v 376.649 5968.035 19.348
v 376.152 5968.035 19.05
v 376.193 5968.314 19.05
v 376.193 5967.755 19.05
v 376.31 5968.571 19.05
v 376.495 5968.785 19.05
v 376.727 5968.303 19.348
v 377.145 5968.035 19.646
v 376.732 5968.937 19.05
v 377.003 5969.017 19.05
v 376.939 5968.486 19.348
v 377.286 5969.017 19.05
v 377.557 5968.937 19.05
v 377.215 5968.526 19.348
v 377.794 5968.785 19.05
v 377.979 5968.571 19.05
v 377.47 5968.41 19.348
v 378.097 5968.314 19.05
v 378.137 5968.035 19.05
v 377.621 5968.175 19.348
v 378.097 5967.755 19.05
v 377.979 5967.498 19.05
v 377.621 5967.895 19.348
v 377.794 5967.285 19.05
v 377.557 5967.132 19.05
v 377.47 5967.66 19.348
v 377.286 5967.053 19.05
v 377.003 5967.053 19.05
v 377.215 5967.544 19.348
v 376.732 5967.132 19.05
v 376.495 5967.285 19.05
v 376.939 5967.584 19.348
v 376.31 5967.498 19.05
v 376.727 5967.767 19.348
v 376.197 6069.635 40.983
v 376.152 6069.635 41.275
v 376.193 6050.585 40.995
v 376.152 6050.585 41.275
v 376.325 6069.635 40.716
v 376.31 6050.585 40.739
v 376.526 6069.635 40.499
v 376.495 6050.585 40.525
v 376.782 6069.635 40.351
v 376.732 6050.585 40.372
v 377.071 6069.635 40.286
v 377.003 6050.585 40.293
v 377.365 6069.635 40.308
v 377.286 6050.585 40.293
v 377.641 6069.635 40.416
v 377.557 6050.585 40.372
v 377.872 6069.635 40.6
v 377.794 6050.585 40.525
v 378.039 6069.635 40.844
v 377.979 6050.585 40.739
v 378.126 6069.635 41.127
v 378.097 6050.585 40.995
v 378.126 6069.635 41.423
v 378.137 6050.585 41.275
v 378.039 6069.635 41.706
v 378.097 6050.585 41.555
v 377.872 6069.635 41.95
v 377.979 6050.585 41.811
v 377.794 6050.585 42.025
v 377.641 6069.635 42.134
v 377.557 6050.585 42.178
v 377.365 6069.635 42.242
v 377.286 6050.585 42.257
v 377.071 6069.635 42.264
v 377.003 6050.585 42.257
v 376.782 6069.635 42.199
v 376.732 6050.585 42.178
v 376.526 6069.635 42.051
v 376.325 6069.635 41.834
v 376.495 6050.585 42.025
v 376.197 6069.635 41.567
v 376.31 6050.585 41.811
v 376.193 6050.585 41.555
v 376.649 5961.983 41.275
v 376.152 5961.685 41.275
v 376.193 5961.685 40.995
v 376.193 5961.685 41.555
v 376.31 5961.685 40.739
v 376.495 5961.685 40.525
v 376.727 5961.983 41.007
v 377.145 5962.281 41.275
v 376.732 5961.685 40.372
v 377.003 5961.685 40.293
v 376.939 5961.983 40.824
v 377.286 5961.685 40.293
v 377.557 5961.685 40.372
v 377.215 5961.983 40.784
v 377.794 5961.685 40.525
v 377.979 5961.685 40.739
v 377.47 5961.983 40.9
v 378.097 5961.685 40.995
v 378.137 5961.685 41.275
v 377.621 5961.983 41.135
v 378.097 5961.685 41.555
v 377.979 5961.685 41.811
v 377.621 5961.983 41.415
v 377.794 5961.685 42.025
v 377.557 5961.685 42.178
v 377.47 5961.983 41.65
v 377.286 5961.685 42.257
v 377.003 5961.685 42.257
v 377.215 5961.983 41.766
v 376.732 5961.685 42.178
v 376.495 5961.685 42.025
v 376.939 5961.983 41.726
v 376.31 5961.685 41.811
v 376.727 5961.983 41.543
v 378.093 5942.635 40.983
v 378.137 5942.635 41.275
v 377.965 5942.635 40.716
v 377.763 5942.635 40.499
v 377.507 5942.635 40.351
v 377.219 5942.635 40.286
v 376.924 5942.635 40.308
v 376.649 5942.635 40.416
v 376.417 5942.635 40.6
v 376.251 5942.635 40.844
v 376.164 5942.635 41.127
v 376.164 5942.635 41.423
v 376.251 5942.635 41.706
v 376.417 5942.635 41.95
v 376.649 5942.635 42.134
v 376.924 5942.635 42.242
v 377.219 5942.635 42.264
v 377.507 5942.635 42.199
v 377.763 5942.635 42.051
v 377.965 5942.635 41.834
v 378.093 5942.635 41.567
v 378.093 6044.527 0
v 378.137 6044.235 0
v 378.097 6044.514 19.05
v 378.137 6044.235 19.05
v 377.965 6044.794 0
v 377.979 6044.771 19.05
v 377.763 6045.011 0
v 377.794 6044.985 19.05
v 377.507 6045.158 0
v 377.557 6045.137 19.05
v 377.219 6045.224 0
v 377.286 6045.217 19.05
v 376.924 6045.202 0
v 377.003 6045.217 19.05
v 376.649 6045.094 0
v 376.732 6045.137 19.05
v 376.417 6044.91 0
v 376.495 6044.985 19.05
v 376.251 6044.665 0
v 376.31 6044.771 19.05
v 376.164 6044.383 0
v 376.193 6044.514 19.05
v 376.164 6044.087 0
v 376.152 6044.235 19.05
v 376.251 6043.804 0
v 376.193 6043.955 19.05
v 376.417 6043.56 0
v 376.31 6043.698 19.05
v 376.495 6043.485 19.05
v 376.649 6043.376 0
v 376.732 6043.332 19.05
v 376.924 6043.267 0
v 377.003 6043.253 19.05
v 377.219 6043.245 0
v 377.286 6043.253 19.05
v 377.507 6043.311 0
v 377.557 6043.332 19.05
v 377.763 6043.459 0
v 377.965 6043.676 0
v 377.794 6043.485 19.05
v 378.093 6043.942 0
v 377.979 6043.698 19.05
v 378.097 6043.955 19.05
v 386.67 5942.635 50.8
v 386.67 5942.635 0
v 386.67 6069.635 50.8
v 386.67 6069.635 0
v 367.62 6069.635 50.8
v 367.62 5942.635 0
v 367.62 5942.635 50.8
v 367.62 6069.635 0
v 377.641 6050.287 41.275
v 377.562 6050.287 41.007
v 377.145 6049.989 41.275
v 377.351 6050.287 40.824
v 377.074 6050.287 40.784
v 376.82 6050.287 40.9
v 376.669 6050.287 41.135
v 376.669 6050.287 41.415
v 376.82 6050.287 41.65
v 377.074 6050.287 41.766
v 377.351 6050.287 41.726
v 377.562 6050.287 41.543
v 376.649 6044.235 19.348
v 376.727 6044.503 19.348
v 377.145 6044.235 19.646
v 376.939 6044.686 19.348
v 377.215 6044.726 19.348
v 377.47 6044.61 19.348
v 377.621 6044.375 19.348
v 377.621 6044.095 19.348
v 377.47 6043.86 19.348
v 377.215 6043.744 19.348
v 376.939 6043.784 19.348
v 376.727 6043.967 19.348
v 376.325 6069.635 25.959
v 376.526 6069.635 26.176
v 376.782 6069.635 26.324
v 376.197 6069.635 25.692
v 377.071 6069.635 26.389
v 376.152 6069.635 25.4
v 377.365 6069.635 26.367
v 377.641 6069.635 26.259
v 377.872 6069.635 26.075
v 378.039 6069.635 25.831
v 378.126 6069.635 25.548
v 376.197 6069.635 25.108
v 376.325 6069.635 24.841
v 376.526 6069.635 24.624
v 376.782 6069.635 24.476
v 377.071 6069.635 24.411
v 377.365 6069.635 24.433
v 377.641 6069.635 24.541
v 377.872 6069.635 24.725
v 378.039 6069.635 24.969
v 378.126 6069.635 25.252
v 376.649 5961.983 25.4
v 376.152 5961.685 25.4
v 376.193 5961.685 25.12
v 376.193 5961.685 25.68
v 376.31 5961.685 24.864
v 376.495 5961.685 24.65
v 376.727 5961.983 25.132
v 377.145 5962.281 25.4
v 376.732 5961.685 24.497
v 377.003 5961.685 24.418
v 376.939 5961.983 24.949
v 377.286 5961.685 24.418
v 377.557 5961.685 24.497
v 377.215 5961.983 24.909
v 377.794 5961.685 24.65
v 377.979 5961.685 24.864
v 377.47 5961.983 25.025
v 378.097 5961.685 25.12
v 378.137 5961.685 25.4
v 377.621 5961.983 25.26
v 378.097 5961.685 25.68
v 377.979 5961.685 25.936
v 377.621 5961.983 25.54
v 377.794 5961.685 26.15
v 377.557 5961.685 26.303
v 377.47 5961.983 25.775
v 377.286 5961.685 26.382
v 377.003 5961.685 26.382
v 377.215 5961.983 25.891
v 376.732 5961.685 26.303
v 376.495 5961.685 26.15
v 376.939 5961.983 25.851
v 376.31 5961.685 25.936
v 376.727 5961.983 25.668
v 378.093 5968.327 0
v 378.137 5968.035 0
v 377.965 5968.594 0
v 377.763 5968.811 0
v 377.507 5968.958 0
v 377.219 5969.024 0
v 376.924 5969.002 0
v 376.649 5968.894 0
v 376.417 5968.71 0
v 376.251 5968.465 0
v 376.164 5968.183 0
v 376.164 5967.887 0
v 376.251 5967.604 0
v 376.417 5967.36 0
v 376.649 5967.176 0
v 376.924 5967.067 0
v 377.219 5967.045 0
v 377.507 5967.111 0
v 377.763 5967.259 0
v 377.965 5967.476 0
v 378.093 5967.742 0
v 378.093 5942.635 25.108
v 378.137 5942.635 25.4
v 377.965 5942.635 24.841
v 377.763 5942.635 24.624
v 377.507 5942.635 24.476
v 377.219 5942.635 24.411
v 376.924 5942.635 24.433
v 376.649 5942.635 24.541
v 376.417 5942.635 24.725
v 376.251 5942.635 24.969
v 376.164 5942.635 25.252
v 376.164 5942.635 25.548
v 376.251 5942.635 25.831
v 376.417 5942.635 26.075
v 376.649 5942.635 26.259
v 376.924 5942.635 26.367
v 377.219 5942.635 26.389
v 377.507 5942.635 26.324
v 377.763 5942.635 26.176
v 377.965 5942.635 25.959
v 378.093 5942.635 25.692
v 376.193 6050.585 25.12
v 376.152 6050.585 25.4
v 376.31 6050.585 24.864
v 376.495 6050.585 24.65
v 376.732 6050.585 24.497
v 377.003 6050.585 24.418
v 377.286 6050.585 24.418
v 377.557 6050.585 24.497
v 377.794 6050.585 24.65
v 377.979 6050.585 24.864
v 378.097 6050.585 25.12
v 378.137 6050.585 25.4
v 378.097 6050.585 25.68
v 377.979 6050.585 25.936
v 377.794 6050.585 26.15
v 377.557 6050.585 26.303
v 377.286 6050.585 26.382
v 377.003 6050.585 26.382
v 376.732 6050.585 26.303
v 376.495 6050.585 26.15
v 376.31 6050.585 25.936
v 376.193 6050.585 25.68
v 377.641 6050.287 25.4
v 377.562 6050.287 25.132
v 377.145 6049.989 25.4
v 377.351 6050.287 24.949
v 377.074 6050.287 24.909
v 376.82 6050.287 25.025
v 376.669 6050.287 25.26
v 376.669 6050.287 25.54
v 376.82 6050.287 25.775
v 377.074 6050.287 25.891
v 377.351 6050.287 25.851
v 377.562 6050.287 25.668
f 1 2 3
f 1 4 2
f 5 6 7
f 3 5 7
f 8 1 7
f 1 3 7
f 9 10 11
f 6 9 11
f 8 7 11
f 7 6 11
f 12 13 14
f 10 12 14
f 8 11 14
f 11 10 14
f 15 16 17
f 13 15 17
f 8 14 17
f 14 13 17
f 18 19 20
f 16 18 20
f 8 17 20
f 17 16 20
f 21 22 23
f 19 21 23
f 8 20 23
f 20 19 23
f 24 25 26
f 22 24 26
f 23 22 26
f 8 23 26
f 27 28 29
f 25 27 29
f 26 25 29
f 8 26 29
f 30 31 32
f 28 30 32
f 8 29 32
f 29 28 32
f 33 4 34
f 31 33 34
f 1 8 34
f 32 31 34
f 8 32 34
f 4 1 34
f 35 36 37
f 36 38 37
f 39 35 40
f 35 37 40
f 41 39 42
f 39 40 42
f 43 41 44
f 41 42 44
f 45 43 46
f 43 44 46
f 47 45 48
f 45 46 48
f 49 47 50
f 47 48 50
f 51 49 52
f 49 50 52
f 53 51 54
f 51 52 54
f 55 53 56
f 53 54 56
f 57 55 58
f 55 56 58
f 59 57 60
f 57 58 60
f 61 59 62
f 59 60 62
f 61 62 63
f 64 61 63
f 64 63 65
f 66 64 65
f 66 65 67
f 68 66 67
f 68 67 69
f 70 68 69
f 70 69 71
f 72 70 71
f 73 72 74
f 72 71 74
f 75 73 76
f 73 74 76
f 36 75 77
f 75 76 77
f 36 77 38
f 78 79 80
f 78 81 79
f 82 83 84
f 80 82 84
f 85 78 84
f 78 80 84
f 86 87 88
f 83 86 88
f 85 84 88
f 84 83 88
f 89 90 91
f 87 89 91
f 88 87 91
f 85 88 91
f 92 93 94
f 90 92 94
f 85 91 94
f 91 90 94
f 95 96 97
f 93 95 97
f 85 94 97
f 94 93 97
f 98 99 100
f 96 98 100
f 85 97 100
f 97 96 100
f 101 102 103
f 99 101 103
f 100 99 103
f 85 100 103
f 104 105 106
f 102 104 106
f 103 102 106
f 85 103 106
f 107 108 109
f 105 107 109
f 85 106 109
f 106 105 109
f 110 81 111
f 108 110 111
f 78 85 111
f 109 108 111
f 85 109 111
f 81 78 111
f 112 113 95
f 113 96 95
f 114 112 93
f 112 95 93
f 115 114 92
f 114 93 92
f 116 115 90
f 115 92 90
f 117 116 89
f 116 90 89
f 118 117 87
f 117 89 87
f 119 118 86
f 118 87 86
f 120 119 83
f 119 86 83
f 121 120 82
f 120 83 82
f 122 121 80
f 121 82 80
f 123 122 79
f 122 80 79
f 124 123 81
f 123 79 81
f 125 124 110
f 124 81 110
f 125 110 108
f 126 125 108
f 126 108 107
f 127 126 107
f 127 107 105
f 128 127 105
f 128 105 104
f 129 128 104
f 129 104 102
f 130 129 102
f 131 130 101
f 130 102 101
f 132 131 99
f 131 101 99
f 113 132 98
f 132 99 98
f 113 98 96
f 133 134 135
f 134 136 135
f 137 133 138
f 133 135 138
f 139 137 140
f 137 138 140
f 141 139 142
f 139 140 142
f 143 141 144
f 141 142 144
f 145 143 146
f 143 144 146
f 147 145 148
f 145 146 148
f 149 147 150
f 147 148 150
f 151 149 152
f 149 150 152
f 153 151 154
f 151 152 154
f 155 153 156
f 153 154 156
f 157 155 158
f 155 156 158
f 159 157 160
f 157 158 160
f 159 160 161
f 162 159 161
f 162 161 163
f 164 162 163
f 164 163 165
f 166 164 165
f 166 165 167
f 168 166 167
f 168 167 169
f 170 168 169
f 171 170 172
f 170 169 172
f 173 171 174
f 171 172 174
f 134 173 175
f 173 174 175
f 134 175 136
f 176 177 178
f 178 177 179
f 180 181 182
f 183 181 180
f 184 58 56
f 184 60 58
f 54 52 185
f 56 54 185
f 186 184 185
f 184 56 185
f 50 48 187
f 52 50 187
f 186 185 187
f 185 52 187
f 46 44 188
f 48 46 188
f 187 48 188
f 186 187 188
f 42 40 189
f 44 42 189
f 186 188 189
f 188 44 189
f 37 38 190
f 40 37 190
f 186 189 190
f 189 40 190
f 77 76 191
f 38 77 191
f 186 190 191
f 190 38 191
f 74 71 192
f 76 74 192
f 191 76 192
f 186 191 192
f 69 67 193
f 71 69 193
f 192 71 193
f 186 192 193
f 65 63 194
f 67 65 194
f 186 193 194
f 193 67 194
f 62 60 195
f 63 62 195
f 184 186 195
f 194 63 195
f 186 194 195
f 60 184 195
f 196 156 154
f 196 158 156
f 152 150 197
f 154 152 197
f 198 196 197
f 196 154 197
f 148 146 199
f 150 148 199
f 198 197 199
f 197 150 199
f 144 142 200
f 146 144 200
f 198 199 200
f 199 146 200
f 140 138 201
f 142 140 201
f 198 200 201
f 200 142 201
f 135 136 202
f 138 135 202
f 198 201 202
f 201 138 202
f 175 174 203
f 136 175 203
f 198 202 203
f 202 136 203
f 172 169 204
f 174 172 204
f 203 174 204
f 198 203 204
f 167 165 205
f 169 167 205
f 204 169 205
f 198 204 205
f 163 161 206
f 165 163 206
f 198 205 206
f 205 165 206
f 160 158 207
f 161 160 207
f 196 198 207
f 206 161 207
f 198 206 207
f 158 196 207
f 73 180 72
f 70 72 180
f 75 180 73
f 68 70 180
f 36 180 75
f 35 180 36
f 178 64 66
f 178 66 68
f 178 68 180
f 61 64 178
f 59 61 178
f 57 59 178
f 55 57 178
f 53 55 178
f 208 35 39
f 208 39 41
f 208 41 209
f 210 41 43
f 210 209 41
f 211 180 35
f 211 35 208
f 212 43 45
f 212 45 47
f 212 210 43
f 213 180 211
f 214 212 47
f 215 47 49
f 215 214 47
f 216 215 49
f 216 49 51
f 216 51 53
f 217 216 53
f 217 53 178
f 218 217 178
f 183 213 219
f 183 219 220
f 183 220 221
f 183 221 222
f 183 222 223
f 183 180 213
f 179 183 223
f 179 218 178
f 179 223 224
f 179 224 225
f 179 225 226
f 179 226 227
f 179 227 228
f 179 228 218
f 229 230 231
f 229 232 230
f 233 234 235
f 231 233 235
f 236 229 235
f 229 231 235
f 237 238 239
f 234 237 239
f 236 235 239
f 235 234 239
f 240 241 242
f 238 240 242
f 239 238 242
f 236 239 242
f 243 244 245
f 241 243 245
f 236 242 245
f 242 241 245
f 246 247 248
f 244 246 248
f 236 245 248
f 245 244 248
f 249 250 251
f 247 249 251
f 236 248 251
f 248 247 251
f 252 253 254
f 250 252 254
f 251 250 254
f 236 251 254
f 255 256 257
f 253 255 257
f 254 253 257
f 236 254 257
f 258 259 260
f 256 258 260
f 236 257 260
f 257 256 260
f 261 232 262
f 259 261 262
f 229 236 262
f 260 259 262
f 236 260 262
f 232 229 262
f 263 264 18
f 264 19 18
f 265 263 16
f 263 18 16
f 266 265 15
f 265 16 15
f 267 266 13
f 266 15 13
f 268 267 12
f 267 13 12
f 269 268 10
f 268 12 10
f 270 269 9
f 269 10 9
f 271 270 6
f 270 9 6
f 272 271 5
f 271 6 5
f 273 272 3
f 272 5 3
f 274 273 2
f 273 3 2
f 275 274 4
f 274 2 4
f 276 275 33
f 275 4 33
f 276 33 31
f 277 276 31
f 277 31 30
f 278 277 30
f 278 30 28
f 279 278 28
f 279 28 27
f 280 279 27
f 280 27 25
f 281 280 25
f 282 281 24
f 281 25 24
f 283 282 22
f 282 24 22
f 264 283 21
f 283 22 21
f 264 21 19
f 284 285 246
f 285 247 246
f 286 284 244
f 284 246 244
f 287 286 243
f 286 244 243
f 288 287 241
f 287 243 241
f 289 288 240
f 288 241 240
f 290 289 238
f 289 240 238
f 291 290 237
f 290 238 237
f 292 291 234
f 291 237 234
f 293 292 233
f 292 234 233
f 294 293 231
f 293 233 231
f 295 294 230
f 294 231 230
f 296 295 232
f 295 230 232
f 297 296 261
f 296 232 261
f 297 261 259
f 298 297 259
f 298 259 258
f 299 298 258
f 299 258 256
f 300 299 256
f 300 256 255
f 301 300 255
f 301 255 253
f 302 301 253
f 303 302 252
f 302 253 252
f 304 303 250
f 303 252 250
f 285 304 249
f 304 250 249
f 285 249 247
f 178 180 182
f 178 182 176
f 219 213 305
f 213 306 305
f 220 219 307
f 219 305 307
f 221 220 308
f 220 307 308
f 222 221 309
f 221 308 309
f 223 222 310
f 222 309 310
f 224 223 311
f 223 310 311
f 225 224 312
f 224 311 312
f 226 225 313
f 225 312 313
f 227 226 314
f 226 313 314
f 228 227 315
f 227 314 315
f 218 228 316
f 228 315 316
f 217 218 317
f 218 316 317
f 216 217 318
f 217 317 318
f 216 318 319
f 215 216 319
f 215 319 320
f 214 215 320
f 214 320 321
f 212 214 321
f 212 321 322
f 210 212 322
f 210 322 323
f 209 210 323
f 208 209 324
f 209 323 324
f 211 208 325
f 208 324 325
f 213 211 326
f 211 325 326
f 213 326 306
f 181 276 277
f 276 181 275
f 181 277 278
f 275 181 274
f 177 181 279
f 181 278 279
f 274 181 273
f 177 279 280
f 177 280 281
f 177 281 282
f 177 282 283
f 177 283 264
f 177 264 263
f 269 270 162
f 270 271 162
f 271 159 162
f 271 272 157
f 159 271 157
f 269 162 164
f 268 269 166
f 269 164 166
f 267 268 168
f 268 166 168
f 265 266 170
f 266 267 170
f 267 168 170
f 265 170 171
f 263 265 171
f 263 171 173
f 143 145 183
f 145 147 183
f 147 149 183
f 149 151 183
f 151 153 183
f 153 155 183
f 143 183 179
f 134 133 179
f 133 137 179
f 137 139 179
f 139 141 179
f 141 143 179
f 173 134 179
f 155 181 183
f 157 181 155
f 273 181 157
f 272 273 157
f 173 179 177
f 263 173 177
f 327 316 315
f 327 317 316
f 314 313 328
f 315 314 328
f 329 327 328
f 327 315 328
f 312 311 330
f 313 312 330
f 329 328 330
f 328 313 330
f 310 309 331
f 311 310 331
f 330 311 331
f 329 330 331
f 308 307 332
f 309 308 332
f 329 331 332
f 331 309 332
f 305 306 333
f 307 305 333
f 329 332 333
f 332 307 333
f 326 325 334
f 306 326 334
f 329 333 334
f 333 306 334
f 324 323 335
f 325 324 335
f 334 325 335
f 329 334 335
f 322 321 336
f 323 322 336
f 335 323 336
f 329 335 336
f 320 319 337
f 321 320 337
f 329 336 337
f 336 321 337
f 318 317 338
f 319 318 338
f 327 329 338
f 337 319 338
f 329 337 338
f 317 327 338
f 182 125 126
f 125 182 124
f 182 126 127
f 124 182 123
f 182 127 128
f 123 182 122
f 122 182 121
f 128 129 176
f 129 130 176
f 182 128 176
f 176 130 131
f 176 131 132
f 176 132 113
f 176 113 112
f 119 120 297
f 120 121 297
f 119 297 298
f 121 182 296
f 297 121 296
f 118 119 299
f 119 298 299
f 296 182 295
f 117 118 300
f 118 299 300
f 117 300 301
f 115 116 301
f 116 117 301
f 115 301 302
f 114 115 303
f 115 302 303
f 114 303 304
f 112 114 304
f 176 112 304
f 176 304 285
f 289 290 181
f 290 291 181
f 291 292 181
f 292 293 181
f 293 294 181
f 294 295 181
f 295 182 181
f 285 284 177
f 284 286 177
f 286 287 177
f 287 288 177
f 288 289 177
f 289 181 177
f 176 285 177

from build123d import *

# Parameters (mm, degrees)
SKETCH1_W                           = 19.05
SKETCH1_H                           = 126.999999888
BOSS_EXTRUDE1_DEPTH                 = 50.8
F_5_64_0_07813_DIAMETER_HOLE1_D     = 1.984502
F_5_64_0_07813_DIAMETER_HOLE1_DEPTH = 38.1
F_5_64_0_07813_DIAMETER_HOLE1_TIP   = 0.59620455
F_5_64_0_07813_DIAMETER_HOLE6_D     = 1.984502
F_5_64_0_07813_DIAMETER_HOLE6_DEPTH = 19.05
F_5_64_0_07813_DIAMETER_HOLE6_TIP   = 0.59620455
F_5_64_0_07813_DIAMETER_HOLE7_D     = 1.984502
F_5_64_0_07813_DIAMETER_HOLE7_DEPTH = 19.05
F_5_64_0_07813_DIAMETER_HOLE7_TIP   = 0.59620455


with BuildPart() as part:
    # Sketch1 → Boss-Extrude1 (new body)
    with BuildSketch(Plane.XY):
        with Locations((377.144680647, 6006.134818763)):
            Rectangle(SKETCH1_W, SKETCH1_H)
    extrude(amount=BOSS_EXTRUDE1_DEPTH)

    # 5/64 (0.07813) Diameter Hole1
    with Locations(Plane(origin=(-83.853965539, -12.395181178, -19.050087596), x_dir=(-1, 0, 0), z_dir=(0, 0, -1))):
        with Locations((-481.589248274, 6993.254992531), (-386.339248274, 6993.254992531), (-291.089248274, 6993.254992531), (-295.274999999, 6965.135938475), (-295.274999999, 6812.735938475), (-295.274999999, 6660.335938474), (-285.166362357, 6631.468843414), (-475.477307398, 6631.468752771), (-485.002307398, 6660.335938474), (-485.002307398, 6812.735938474), (-485.002307398, 6965.135938474), (-478.365617646, 6611.6708), (-287.865617646, 6611.6708), (-307.975, 6564.3379), (-307.975, 6488.1379), (-284.960913066, 6440.805), (-380.210913066, 6440.805), (-475.460913066, 6440.805), (-446.831312422, 6488.1379), (-446.831312422, 6564.3379), (-472.231312422, 6396.355), (-472.231312422, 6320.155), (-472.653156211, 6275.705000839), (-377.403156211, 6275.705000839), (-282.153156211, 6275.705000839), (-282.575, 6320.155), (-282.575, 6396.355), (-435.598646187, 6221.729999816), (-435.598646187, 6145.529999816), (-450.592518112, 6091.554999951), (-460.998646187, 6091.555478285), (-460.998646187, 6056.629999944), (-460.998646187, 5980.429999944), (-460.998646187, 5945.505000042), (-282.153156211, 5945.505000042), (-368.611823093, 5945.505000042)):
            Hole(F_5_64_0_07813_DIAMETER_HOLE1_D / 2, depth=F_5_64_0_07813_DIAMETER_HOLE1_DEPTH)
            with Locations((0, 0, -(F_5_64_0_07813_DIAMETER_HOLE1_DEPTH + F_5_64_0_07813_DIAMETER_HOLE1_TIP / 2))):  # 118° drill point
                Cone(0, F_5_64_0_07813_DIAMETER_HOLE1_D / 2, F_5_64_0_07813_DIAMETER_HOLE1_TIP, mode=Mode.SUBTRACT)

    # 5/64 (0.07813) Diameter Hole6
    with Locations(Plane(origin=(0, 5942.634818819, 0), x_dir=(-1, 0, 0), z_dir=(0, -1, 0))):
        with Locations((-377.144680647, -41.274997961), (-377.144680647, -25.399997961)):
            Hole(F_5_64_0_07813_DIAMETER_HOLE6_D / 2, depth=F_5_64_0_07813_DIAMETER_HOLE6_DEPTH)
            with Locations((0, 0, -(F_5_64_0_07813_DIAMETER_HOLE6_DEPTH + F_5_64_0_07813_DIAMETER_HOLE6_TIP / 2))):  # 118° drill point
                Cone(0, F_5_64_0_07813_DIAMETER_HOLE6_D / 2, F_5_64_0_07813_DIAMETER_HOLE6_TIP, mode=Mode.SUBTRACT)

    # 5/64 (0.07813) Diameter Hole7
    with Locations(Plane(origin=(0, 6069.634818707, 0), x_dir=(1, 0, 0), z_dir=(0, 1, 0))):
        with Locations((377.144680647, -41.274997961), (377.144680647, -25.399997961)):
            Hole(F_5_64_0_07813_DIAMETER_HOLE7_D / 2, depth=F_5_64_0_07813_DIAMETER_HOLE7_DEPTH)
            with Locations((0, 0, -(F_5_64_0_07813_DIAMETER_HOLE7_DEPTH + F_5_64_0_07813_DIAMETER_HOLE7_TIP / 2))):  # 118° drill point
                Cone(0, F_5_64_0_07813_DIAMETER_HOLE7_D / 2, F_5_64_0_07813_DIAMETER_HOLE7_TIP, mode=Mode.SUBTRACT)


solid = part.part
